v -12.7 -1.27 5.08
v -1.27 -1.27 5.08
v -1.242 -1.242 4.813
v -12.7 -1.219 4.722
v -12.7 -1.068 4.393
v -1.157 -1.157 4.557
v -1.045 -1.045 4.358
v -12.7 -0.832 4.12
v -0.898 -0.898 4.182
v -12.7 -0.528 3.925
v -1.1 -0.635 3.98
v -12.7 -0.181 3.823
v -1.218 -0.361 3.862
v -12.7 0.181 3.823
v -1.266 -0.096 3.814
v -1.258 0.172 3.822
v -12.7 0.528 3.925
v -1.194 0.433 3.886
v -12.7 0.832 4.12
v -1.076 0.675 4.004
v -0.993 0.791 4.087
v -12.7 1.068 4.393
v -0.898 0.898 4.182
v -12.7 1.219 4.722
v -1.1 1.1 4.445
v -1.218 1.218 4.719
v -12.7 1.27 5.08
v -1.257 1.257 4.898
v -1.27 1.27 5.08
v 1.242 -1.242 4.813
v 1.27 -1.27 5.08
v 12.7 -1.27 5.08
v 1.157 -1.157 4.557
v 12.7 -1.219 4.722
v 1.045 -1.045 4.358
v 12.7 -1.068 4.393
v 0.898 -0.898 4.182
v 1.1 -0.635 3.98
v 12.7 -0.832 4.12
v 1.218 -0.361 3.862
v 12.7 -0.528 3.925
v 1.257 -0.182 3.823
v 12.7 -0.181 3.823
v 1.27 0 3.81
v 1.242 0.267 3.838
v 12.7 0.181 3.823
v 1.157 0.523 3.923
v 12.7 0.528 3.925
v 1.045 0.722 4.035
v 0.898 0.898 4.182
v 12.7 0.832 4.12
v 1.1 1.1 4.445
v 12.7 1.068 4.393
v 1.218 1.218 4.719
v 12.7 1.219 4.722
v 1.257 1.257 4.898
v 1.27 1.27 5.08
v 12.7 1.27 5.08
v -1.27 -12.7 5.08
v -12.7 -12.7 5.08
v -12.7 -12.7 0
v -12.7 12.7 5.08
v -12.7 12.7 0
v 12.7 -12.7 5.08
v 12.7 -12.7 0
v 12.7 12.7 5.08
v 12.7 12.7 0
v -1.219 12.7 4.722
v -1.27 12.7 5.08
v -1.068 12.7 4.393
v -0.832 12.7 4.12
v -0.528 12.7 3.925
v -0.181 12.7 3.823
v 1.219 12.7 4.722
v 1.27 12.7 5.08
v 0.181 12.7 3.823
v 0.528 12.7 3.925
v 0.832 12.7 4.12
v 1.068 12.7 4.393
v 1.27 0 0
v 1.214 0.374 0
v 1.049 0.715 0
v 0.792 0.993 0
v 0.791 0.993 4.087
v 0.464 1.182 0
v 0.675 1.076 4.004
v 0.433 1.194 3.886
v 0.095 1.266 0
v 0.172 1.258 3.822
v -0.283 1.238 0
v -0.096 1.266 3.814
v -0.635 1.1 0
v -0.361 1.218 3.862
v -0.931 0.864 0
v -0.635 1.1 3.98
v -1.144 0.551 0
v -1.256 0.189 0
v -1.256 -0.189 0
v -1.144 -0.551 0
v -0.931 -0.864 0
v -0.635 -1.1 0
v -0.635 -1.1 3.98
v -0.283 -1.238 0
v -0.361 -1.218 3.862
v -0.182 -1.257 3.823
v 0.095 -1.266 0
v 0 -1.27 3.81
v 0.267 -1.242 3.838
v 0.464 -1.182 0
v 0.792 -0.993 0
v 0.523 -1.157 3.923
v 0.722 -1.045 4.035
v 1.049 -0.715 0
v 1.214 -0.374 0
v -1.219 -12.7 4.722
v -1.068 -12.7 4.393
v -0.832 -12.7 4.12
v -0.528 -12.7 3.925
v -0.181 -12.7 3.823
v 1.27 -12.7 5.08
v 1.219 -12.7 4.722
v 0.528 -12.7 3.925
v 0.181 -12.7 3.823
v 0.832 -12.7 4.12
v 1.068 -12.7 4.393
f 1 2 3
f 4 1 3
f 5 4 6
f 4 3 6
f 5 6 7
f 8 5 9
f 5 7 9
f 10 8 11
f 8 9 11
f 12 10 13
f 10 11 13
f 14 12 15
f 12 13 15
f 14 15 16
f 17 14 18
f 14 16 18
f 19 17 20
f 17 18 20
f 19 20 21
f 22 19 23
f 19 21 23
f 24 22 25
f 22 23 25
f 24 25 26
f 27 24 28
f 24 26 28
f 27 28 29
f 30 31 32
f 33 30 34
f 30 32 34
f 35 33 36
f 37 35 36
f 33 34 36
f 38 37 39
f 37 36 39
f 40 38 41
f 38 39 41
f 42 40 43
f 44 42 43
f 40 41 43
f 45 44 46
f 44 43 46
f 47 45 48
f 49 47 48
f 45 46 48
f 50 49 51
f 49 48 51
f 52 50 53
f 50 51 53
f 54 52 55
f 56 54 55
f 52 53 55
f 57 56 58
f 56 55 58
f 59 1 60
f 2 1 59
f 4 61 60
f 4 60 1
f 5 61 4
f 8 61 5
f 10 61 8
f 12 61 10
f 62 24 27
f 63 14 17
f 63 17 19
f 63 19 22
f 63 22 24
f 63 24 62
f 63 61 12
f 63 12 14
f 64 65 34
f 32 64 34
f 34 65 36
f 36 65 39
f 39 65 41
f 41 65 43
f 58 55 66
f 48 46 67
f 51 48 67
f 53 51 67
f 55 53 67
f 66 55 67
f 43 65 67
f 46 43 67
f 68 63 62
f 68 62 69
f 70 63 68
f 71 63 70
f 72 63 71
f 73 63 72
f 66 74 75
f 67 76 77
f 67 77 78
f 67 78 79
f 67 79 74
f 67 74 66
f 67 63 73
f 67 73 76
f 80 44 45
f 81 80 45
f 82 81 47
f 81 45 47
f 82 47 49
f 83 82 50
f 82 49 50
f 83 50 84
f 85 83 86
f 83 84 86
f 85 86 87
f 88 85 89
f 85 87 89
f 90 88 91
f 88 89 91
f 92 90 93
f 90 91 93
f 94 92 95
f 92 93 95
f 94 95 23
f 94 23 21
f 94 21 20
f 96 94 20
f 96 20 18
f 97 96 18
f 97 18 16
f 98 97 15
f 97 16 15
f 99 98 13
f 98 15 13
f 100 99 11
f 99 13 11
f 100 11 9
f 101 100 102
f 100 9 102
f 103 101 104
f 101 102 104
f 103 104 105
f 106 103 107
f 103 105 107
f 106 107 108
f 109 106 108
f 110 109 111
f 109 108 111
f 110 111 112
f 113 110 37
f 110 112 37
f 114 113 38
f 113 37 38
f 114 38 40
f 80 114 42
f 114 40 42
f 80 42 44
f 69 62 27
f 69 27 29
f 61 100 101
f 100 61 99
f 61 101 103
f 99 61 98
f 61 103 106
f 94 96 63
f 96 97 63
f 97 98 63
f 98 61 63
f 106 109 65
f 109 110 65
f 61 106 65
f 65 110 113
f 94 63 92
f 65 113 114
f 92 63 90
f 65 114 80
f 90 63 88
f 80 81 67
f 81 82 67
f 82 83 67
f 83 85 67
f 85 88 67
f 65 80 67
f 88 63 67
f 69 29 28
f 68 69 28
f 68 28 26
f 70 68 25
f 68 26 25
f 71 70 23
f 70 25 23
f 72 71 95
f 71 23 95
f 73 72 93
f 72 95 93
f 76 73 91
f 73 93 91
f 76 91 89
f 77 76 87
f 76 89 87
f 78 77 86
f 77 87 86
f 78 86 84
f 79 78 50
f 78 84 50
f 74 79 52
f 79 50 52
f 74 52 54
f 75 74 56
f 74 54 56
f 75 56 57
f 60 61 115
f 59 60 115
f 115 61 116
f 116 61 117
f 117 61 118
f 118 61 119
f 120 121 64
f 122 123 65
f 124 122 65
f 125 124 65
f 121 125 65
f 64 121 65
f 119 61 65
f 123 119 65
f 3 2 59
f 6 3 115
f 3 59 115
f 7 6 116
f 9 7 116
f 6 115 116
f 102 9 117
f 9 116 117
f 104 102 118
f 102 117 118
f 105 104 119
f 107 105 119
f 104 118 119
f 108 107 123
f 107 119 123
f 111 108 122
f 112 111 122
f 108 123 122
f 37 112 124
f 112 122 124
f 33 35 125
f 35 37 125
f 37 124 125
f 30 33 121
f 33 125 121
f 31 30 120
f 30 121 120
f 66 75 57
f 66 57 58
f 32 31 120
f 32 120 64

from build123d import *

# Parameters (mm, degrees)
F0_W     = 25.4
F0_H     = 25.4
F1_DEPTH = 5.08
F3_DEPTH = 25.4
F5_DEPTH = 25.4
F6_R     = 1.27
F7_DEPTH = 25.4


with BuildPart() as f1:
    # F0 (on Top) → F1 (new body)
    with BuildSketch(Plane.XY):
        Rectangle(F0_W, F0_H)
    extrude(amount=F1_DEPTH)

    # F2 (on face) → F3 (cut)
    with BuildSketch(Plane.YZ.offset(12.7)):
        with BuildLine():
            ThreePointArc((-1.27, 5.08), (0, 3.81), (1.27, 5.08))
            Line((1.27, 5.08), (-1.27, 5.08))
        make_face()
    extrude(amount=-F3_DEPTH, mode=Mode.SUBTRACT)

    # F4 (on face) → F5 (cut)
    with BuildSketch(Plane.XZ.offset(12.7)):
        with BuildLine():
            ThreePointArc((-1.27, 5.08), (0, 3.81), (1.27, 5.08))
            Line((1.27, 5.08), (-1.27, 5.08))
        make_face()
    extrude(amount=-F5_DEPTH, mode=Mode.SUBTRACT)

    # F6 (on face) → F7 (cut)
    with BuildSketch(Plane.XY.offset(5.08)):
        Circle(F6_R)
    extrude(amount=-F7_DEPTH, mode=Mode.SUBTRACT)


solid = f1.part
